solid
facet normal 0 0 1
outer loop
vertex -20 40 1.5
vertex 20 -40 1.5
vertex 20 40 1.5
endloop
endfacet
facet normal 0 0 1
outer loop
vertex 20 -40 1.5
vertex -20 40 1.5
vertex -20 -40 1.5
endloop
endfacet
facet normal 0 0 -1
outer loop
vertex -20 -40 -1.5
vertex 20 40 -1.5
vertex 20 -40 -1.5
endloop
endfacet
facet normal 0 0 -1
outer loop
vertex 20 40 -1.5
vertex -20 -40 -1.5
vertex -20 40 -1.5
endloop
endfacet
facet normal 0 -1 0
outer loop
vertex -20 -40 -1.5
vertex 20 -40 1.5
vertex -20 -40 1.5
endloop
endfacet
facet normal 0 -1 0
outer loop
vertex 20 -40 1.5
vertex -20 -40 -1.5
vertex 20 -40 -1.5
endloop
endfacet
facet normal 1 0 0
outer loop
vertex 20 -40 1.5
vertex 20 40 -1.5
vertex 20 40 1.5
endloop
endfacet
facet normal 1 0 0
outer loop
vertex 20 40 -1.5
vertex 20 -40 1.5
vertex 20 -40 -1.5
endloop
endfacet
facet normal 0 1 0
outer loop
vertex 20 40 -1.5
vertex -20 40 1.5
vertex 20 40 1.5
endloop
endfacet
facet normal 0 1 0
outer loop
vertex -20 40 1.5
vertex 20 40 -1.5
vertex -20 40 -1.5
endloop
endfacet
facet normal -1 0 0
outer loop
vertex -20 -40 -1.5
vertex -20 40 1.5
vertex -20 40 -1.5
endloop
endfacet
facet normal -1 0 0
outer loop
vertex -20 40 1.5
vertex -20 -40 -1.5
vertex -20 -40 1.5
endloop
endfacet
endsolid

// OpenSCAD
module CameraPlatform() {
  cube(size=[40, 80, 3], center=true);
}

CameraPlatform();
